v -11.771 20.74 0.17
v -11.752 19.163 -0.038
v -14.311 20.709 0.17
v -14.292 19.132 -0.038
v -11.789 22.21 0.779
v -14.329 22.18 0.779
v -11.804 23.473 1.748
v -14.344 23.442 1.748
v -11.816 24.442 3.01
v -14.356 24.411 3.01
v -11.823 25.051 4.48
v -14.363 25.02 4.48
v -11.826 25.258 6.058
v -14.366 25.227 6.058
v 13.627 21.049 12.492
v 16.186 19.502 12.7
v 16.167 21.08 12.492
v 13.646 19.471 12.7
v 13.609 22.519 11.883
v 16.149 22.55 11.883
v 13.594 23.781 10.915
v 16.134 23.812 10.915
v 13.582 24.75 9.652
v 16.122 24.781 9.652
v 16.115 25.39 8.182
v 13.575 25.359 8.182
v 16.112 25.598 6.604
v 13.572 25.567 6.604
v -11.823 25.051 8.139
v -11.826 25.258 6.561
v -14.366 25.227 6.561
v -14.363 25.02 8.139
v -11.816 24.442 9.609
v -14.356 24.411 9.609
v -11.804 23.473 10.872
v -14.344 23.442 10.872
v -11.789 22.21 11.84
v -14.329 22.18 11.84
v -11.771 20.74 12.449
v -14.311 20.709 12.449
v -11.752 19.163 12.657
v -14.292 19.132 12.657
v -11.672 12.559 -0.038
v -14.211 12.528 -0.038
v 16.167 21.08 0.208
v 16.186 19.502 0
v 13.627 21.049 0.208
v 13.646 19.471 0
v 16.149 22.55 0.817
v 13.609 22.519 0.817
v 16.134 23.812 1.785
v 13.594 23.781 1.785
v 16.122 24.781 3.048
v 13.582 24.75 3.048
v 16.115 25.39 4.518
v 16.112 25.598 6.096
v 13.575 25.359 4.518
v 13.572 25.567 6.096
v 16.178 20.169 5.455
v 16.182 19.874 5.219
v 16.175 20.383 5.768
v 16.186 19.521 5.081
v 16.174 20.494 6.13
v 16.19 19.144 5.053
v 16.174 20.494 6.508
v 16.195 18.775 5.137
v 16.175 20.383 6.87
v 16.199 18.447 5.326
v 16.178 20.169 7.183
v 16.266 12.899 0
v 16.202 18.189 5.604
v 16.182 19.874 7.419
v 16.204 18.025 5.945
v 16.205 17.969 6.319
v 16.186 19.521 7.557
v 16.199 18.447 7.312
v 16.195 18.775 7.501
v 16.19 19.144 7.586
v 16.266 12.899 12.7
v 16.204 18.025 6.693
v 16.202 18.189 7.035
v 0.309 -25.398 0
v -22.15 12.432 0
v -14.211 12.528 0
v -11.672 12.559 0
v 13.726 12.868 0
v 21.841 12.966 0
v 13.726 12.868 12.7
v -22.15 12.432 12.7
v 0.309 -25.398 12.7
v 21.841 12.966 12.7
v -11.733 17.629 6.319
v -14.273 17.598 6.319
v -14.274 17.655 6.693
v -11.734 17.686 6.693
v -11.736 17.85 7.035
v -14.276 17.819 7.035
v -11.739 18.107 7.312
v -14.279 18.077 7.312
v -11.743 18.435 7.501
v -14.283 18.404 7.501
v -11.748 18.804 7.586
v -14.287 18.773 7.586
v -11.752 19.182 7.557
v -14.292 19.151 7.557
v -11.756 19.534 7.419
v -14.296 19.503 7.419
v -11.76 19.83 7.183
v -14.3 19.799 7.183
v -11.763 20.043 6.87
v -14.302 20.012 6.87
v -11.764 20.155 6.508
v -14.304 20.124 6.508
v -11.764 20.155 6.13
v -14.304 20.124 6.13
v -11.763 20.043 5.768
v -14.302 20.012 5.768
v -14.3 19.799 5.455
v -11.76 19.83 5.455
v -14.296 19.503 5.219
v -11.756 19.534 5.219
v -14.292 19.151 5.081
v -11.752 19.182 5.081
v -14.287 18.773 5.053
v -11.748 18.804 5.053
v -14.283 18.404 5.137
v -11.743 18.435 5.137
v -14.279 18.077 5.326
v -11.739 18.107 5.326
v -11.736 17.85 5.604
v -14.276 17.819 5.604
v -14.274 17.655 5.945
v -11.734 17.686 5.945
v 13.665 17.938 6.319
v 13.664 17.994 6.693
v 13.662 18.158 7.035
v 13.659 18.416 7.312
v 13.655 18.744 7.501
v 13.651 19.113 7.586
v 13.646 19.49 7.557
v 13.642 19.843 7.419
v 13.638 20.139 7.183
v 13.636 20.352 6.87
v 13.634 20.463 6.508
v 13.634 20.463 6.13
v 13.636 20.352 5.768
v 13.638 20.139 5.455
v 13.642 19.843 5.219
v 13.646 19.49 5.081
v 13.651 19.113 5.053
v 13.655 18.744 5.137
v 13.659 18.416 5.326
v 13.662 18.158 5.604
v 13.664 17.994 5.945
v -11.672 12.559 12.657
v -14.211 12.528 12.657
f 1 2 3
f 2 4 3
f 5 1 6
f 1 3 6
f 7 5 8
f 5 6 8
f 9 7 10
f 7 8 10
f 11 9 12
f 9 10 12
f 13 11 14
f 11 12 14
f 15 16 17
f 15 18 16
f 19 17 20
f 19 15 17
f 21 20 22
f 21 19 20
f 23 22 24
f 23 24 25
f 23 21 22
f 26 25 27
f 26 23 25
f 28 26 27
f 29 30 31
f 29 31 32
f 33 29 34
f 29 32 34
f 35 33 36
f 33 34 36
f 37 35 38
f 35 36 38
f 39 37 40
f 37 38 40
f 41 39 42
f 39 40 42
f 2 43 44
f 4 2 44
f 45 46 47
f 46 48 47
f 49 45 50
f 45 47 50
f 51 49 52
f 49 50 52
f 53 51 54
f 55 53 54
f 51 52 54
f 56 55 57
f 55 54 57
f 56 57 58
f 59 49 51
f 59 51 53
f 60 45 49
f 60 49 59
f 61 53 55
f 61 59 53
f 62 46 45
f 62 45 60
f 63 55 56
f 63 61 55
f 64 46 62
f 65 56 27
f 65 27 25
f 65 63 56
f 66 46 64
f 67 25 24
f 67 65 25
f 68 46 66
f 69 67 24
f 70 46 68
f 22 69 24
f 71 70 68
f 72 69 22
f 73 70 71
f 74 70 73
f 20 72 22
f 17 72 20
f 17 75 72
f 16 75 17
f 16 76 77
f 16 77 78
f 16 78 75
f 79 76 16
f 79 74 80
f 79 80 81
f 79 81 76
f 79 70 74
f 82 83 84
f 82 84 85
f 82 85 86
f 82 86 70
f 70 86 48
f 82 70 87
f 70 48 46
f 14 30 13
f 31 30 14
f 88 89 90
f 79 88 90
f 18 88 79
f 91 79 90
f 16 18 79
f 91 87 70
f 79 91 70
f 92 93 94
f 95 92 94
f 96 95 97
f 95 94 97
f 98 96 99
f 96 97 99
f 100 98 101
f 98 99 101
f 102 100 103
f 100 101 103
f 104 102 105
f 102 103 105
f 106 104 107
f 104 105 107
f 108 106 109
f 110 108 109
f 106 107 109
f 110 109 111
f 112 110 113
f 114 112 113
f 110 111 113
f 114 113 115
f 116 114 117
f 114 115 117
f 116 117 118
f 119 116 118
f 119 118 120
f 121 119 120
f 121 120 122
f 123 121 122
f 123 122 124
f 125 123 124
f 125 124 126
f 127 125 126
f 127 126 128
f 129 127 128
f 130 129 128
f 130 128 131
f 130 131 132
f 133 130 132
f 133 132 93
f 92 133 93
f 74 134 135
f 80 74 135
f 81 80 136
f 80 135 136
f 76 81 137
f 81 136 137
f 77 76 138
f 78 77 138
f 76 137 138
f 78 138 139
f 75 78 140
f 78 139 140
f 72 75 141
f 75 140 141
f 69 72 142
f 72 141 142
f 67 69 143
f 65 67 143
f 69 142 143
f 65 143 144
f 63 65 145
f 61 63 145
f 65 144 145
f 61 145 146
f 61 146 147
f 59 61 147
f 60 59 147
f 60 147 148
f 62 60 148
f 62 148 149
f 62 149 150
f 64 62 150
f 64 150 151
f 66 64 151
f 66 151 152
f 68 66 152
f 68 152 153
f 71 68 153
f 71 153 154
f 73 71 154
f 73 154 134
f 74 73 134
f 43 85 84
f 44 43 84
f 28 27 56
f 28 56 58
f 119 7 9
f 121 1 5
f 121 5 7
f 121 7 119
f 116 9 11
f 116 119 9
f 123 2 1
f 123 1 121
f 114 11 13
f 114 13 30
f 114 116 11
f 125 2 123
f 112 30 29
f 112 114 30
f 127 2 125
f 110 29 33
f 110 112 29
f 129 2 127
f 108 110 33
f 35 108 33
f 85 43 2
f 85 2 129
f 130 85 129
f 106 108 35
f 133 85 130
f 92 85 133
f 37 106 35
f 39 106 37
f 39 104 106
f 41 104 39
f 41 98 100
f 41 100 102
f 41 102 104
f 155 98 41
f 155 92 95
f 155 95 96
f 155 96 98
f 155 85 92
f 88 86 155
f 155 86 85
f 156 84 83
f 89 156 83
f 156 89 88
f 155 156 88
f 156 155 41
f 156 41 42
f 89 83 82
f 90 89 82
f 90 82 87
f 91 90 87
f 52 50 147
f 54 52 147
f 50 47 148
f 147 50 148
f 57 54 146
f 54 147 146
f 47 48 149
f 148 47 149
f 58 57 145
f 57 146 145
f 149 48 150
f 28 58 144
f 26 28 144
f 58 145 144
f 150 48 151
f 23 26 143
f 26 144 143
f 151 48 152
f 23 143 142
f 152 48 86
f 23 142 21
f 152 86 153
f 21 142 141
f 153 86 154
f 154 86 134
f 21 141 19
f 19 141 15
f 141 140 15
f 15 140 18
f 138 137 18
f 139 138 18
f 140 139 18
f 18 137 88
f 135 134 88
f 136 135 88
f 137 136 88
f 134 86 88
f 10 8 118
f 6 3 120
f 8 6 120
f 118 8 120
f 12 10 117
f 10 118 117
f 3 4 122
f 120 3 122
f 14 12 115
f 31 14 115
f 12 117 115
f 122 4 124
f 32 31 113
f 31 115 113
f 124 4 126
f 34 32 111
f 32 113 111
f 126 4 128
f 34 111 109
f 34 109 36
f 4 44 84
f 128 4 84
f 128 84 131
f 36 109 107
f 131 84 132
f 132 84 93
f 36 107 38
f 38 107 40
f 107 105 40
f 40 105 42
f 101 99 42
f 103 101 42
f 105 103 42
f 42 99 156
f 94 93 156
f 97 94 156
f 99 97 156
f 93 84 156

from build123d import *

# Parameters (mm, degrees)
F1_DEPTH = 12.7
F4_DEPTH = 12.7
F5_W     = 2.54
F5_H     = 12.7
F5_H_2   = 12.6950503836
F6_DEPTH = 12.7
F7_R     = 1.27
F8_DEPTH = 41.148
F9_R     = 6.096
F10_R    = 6.096


with BuildPart() as f1:
    # F0 (on Top) → F1 (new body)
    with BuildSketch(Plane.XY):
        Polygon((16.375921394, 19.4162096841), (-25.0028915287, 4.4738590955), (8.6269701347, -23.8900687796), align=None)
    extrude(amount=F1_DEPTH)


with BuildPart() as f4:
    # F3 (on Top) → F4 (new body)
    with BuildSketch(Plane.XY):
        Polygon((0.3085586267, -25.3981257492), (21.841142794, 12.9662824839), (-22.1497014207, 12.4318432653), align=None)
    extrude(amount=F4_DEPTH)

    # F5 (on face) → F6 (join)
    with BuildSketch(Plane(origin=(-0.1542793134, 12.6990628746, 0), x_dir=(-0.9999262106, -0.0121479774, 0), z_dir=(-0.0121479774, 0.9999262106, 0))):
        with Locations((-15.151783279, 6.35)):
            Rectangle(F5_W, F5_H)
        with Locations((12.788216721, 6.3096207778)):
            Rectangle(F5_W, F5_H_2)
    extrude(amount=F6_DEPTH)

    # F7 (on face) → F8 (cut)
    with BuildSketch(Plane(origin=(-14.0571793737, -0.1707788994, 0), x_dir=(0.0121479774, -0.9999262106, 0), z_dir=(-0.9999262106, -0.0121479774, 0))):
        with Locations((-19.0405060285, 6.3191110491)):
            Circle(F7_R)
    extrude(amount=-F8_DEPTH, mode=Mode.SUBTRACT)

    # F9
    f9_edges = [f4.edges().sort_by_distance(p)[0] for p in [
        (-13.095832, 25.242775, 12.657146),
        (-13.095832, 25.242775, -0.037904),
    ]]
    fillet(f9_edges, radius=F9_R)

    # F10
    f10_edges = [f4.edges().sort_by_distance(p)[0] for p in [
        (14.842107, 25.582189, 12.7),
        (14.842107, 25.582189, 0),
    ]]
    fillet(f10_edges, radius=F10_R)


solid = f4.part
